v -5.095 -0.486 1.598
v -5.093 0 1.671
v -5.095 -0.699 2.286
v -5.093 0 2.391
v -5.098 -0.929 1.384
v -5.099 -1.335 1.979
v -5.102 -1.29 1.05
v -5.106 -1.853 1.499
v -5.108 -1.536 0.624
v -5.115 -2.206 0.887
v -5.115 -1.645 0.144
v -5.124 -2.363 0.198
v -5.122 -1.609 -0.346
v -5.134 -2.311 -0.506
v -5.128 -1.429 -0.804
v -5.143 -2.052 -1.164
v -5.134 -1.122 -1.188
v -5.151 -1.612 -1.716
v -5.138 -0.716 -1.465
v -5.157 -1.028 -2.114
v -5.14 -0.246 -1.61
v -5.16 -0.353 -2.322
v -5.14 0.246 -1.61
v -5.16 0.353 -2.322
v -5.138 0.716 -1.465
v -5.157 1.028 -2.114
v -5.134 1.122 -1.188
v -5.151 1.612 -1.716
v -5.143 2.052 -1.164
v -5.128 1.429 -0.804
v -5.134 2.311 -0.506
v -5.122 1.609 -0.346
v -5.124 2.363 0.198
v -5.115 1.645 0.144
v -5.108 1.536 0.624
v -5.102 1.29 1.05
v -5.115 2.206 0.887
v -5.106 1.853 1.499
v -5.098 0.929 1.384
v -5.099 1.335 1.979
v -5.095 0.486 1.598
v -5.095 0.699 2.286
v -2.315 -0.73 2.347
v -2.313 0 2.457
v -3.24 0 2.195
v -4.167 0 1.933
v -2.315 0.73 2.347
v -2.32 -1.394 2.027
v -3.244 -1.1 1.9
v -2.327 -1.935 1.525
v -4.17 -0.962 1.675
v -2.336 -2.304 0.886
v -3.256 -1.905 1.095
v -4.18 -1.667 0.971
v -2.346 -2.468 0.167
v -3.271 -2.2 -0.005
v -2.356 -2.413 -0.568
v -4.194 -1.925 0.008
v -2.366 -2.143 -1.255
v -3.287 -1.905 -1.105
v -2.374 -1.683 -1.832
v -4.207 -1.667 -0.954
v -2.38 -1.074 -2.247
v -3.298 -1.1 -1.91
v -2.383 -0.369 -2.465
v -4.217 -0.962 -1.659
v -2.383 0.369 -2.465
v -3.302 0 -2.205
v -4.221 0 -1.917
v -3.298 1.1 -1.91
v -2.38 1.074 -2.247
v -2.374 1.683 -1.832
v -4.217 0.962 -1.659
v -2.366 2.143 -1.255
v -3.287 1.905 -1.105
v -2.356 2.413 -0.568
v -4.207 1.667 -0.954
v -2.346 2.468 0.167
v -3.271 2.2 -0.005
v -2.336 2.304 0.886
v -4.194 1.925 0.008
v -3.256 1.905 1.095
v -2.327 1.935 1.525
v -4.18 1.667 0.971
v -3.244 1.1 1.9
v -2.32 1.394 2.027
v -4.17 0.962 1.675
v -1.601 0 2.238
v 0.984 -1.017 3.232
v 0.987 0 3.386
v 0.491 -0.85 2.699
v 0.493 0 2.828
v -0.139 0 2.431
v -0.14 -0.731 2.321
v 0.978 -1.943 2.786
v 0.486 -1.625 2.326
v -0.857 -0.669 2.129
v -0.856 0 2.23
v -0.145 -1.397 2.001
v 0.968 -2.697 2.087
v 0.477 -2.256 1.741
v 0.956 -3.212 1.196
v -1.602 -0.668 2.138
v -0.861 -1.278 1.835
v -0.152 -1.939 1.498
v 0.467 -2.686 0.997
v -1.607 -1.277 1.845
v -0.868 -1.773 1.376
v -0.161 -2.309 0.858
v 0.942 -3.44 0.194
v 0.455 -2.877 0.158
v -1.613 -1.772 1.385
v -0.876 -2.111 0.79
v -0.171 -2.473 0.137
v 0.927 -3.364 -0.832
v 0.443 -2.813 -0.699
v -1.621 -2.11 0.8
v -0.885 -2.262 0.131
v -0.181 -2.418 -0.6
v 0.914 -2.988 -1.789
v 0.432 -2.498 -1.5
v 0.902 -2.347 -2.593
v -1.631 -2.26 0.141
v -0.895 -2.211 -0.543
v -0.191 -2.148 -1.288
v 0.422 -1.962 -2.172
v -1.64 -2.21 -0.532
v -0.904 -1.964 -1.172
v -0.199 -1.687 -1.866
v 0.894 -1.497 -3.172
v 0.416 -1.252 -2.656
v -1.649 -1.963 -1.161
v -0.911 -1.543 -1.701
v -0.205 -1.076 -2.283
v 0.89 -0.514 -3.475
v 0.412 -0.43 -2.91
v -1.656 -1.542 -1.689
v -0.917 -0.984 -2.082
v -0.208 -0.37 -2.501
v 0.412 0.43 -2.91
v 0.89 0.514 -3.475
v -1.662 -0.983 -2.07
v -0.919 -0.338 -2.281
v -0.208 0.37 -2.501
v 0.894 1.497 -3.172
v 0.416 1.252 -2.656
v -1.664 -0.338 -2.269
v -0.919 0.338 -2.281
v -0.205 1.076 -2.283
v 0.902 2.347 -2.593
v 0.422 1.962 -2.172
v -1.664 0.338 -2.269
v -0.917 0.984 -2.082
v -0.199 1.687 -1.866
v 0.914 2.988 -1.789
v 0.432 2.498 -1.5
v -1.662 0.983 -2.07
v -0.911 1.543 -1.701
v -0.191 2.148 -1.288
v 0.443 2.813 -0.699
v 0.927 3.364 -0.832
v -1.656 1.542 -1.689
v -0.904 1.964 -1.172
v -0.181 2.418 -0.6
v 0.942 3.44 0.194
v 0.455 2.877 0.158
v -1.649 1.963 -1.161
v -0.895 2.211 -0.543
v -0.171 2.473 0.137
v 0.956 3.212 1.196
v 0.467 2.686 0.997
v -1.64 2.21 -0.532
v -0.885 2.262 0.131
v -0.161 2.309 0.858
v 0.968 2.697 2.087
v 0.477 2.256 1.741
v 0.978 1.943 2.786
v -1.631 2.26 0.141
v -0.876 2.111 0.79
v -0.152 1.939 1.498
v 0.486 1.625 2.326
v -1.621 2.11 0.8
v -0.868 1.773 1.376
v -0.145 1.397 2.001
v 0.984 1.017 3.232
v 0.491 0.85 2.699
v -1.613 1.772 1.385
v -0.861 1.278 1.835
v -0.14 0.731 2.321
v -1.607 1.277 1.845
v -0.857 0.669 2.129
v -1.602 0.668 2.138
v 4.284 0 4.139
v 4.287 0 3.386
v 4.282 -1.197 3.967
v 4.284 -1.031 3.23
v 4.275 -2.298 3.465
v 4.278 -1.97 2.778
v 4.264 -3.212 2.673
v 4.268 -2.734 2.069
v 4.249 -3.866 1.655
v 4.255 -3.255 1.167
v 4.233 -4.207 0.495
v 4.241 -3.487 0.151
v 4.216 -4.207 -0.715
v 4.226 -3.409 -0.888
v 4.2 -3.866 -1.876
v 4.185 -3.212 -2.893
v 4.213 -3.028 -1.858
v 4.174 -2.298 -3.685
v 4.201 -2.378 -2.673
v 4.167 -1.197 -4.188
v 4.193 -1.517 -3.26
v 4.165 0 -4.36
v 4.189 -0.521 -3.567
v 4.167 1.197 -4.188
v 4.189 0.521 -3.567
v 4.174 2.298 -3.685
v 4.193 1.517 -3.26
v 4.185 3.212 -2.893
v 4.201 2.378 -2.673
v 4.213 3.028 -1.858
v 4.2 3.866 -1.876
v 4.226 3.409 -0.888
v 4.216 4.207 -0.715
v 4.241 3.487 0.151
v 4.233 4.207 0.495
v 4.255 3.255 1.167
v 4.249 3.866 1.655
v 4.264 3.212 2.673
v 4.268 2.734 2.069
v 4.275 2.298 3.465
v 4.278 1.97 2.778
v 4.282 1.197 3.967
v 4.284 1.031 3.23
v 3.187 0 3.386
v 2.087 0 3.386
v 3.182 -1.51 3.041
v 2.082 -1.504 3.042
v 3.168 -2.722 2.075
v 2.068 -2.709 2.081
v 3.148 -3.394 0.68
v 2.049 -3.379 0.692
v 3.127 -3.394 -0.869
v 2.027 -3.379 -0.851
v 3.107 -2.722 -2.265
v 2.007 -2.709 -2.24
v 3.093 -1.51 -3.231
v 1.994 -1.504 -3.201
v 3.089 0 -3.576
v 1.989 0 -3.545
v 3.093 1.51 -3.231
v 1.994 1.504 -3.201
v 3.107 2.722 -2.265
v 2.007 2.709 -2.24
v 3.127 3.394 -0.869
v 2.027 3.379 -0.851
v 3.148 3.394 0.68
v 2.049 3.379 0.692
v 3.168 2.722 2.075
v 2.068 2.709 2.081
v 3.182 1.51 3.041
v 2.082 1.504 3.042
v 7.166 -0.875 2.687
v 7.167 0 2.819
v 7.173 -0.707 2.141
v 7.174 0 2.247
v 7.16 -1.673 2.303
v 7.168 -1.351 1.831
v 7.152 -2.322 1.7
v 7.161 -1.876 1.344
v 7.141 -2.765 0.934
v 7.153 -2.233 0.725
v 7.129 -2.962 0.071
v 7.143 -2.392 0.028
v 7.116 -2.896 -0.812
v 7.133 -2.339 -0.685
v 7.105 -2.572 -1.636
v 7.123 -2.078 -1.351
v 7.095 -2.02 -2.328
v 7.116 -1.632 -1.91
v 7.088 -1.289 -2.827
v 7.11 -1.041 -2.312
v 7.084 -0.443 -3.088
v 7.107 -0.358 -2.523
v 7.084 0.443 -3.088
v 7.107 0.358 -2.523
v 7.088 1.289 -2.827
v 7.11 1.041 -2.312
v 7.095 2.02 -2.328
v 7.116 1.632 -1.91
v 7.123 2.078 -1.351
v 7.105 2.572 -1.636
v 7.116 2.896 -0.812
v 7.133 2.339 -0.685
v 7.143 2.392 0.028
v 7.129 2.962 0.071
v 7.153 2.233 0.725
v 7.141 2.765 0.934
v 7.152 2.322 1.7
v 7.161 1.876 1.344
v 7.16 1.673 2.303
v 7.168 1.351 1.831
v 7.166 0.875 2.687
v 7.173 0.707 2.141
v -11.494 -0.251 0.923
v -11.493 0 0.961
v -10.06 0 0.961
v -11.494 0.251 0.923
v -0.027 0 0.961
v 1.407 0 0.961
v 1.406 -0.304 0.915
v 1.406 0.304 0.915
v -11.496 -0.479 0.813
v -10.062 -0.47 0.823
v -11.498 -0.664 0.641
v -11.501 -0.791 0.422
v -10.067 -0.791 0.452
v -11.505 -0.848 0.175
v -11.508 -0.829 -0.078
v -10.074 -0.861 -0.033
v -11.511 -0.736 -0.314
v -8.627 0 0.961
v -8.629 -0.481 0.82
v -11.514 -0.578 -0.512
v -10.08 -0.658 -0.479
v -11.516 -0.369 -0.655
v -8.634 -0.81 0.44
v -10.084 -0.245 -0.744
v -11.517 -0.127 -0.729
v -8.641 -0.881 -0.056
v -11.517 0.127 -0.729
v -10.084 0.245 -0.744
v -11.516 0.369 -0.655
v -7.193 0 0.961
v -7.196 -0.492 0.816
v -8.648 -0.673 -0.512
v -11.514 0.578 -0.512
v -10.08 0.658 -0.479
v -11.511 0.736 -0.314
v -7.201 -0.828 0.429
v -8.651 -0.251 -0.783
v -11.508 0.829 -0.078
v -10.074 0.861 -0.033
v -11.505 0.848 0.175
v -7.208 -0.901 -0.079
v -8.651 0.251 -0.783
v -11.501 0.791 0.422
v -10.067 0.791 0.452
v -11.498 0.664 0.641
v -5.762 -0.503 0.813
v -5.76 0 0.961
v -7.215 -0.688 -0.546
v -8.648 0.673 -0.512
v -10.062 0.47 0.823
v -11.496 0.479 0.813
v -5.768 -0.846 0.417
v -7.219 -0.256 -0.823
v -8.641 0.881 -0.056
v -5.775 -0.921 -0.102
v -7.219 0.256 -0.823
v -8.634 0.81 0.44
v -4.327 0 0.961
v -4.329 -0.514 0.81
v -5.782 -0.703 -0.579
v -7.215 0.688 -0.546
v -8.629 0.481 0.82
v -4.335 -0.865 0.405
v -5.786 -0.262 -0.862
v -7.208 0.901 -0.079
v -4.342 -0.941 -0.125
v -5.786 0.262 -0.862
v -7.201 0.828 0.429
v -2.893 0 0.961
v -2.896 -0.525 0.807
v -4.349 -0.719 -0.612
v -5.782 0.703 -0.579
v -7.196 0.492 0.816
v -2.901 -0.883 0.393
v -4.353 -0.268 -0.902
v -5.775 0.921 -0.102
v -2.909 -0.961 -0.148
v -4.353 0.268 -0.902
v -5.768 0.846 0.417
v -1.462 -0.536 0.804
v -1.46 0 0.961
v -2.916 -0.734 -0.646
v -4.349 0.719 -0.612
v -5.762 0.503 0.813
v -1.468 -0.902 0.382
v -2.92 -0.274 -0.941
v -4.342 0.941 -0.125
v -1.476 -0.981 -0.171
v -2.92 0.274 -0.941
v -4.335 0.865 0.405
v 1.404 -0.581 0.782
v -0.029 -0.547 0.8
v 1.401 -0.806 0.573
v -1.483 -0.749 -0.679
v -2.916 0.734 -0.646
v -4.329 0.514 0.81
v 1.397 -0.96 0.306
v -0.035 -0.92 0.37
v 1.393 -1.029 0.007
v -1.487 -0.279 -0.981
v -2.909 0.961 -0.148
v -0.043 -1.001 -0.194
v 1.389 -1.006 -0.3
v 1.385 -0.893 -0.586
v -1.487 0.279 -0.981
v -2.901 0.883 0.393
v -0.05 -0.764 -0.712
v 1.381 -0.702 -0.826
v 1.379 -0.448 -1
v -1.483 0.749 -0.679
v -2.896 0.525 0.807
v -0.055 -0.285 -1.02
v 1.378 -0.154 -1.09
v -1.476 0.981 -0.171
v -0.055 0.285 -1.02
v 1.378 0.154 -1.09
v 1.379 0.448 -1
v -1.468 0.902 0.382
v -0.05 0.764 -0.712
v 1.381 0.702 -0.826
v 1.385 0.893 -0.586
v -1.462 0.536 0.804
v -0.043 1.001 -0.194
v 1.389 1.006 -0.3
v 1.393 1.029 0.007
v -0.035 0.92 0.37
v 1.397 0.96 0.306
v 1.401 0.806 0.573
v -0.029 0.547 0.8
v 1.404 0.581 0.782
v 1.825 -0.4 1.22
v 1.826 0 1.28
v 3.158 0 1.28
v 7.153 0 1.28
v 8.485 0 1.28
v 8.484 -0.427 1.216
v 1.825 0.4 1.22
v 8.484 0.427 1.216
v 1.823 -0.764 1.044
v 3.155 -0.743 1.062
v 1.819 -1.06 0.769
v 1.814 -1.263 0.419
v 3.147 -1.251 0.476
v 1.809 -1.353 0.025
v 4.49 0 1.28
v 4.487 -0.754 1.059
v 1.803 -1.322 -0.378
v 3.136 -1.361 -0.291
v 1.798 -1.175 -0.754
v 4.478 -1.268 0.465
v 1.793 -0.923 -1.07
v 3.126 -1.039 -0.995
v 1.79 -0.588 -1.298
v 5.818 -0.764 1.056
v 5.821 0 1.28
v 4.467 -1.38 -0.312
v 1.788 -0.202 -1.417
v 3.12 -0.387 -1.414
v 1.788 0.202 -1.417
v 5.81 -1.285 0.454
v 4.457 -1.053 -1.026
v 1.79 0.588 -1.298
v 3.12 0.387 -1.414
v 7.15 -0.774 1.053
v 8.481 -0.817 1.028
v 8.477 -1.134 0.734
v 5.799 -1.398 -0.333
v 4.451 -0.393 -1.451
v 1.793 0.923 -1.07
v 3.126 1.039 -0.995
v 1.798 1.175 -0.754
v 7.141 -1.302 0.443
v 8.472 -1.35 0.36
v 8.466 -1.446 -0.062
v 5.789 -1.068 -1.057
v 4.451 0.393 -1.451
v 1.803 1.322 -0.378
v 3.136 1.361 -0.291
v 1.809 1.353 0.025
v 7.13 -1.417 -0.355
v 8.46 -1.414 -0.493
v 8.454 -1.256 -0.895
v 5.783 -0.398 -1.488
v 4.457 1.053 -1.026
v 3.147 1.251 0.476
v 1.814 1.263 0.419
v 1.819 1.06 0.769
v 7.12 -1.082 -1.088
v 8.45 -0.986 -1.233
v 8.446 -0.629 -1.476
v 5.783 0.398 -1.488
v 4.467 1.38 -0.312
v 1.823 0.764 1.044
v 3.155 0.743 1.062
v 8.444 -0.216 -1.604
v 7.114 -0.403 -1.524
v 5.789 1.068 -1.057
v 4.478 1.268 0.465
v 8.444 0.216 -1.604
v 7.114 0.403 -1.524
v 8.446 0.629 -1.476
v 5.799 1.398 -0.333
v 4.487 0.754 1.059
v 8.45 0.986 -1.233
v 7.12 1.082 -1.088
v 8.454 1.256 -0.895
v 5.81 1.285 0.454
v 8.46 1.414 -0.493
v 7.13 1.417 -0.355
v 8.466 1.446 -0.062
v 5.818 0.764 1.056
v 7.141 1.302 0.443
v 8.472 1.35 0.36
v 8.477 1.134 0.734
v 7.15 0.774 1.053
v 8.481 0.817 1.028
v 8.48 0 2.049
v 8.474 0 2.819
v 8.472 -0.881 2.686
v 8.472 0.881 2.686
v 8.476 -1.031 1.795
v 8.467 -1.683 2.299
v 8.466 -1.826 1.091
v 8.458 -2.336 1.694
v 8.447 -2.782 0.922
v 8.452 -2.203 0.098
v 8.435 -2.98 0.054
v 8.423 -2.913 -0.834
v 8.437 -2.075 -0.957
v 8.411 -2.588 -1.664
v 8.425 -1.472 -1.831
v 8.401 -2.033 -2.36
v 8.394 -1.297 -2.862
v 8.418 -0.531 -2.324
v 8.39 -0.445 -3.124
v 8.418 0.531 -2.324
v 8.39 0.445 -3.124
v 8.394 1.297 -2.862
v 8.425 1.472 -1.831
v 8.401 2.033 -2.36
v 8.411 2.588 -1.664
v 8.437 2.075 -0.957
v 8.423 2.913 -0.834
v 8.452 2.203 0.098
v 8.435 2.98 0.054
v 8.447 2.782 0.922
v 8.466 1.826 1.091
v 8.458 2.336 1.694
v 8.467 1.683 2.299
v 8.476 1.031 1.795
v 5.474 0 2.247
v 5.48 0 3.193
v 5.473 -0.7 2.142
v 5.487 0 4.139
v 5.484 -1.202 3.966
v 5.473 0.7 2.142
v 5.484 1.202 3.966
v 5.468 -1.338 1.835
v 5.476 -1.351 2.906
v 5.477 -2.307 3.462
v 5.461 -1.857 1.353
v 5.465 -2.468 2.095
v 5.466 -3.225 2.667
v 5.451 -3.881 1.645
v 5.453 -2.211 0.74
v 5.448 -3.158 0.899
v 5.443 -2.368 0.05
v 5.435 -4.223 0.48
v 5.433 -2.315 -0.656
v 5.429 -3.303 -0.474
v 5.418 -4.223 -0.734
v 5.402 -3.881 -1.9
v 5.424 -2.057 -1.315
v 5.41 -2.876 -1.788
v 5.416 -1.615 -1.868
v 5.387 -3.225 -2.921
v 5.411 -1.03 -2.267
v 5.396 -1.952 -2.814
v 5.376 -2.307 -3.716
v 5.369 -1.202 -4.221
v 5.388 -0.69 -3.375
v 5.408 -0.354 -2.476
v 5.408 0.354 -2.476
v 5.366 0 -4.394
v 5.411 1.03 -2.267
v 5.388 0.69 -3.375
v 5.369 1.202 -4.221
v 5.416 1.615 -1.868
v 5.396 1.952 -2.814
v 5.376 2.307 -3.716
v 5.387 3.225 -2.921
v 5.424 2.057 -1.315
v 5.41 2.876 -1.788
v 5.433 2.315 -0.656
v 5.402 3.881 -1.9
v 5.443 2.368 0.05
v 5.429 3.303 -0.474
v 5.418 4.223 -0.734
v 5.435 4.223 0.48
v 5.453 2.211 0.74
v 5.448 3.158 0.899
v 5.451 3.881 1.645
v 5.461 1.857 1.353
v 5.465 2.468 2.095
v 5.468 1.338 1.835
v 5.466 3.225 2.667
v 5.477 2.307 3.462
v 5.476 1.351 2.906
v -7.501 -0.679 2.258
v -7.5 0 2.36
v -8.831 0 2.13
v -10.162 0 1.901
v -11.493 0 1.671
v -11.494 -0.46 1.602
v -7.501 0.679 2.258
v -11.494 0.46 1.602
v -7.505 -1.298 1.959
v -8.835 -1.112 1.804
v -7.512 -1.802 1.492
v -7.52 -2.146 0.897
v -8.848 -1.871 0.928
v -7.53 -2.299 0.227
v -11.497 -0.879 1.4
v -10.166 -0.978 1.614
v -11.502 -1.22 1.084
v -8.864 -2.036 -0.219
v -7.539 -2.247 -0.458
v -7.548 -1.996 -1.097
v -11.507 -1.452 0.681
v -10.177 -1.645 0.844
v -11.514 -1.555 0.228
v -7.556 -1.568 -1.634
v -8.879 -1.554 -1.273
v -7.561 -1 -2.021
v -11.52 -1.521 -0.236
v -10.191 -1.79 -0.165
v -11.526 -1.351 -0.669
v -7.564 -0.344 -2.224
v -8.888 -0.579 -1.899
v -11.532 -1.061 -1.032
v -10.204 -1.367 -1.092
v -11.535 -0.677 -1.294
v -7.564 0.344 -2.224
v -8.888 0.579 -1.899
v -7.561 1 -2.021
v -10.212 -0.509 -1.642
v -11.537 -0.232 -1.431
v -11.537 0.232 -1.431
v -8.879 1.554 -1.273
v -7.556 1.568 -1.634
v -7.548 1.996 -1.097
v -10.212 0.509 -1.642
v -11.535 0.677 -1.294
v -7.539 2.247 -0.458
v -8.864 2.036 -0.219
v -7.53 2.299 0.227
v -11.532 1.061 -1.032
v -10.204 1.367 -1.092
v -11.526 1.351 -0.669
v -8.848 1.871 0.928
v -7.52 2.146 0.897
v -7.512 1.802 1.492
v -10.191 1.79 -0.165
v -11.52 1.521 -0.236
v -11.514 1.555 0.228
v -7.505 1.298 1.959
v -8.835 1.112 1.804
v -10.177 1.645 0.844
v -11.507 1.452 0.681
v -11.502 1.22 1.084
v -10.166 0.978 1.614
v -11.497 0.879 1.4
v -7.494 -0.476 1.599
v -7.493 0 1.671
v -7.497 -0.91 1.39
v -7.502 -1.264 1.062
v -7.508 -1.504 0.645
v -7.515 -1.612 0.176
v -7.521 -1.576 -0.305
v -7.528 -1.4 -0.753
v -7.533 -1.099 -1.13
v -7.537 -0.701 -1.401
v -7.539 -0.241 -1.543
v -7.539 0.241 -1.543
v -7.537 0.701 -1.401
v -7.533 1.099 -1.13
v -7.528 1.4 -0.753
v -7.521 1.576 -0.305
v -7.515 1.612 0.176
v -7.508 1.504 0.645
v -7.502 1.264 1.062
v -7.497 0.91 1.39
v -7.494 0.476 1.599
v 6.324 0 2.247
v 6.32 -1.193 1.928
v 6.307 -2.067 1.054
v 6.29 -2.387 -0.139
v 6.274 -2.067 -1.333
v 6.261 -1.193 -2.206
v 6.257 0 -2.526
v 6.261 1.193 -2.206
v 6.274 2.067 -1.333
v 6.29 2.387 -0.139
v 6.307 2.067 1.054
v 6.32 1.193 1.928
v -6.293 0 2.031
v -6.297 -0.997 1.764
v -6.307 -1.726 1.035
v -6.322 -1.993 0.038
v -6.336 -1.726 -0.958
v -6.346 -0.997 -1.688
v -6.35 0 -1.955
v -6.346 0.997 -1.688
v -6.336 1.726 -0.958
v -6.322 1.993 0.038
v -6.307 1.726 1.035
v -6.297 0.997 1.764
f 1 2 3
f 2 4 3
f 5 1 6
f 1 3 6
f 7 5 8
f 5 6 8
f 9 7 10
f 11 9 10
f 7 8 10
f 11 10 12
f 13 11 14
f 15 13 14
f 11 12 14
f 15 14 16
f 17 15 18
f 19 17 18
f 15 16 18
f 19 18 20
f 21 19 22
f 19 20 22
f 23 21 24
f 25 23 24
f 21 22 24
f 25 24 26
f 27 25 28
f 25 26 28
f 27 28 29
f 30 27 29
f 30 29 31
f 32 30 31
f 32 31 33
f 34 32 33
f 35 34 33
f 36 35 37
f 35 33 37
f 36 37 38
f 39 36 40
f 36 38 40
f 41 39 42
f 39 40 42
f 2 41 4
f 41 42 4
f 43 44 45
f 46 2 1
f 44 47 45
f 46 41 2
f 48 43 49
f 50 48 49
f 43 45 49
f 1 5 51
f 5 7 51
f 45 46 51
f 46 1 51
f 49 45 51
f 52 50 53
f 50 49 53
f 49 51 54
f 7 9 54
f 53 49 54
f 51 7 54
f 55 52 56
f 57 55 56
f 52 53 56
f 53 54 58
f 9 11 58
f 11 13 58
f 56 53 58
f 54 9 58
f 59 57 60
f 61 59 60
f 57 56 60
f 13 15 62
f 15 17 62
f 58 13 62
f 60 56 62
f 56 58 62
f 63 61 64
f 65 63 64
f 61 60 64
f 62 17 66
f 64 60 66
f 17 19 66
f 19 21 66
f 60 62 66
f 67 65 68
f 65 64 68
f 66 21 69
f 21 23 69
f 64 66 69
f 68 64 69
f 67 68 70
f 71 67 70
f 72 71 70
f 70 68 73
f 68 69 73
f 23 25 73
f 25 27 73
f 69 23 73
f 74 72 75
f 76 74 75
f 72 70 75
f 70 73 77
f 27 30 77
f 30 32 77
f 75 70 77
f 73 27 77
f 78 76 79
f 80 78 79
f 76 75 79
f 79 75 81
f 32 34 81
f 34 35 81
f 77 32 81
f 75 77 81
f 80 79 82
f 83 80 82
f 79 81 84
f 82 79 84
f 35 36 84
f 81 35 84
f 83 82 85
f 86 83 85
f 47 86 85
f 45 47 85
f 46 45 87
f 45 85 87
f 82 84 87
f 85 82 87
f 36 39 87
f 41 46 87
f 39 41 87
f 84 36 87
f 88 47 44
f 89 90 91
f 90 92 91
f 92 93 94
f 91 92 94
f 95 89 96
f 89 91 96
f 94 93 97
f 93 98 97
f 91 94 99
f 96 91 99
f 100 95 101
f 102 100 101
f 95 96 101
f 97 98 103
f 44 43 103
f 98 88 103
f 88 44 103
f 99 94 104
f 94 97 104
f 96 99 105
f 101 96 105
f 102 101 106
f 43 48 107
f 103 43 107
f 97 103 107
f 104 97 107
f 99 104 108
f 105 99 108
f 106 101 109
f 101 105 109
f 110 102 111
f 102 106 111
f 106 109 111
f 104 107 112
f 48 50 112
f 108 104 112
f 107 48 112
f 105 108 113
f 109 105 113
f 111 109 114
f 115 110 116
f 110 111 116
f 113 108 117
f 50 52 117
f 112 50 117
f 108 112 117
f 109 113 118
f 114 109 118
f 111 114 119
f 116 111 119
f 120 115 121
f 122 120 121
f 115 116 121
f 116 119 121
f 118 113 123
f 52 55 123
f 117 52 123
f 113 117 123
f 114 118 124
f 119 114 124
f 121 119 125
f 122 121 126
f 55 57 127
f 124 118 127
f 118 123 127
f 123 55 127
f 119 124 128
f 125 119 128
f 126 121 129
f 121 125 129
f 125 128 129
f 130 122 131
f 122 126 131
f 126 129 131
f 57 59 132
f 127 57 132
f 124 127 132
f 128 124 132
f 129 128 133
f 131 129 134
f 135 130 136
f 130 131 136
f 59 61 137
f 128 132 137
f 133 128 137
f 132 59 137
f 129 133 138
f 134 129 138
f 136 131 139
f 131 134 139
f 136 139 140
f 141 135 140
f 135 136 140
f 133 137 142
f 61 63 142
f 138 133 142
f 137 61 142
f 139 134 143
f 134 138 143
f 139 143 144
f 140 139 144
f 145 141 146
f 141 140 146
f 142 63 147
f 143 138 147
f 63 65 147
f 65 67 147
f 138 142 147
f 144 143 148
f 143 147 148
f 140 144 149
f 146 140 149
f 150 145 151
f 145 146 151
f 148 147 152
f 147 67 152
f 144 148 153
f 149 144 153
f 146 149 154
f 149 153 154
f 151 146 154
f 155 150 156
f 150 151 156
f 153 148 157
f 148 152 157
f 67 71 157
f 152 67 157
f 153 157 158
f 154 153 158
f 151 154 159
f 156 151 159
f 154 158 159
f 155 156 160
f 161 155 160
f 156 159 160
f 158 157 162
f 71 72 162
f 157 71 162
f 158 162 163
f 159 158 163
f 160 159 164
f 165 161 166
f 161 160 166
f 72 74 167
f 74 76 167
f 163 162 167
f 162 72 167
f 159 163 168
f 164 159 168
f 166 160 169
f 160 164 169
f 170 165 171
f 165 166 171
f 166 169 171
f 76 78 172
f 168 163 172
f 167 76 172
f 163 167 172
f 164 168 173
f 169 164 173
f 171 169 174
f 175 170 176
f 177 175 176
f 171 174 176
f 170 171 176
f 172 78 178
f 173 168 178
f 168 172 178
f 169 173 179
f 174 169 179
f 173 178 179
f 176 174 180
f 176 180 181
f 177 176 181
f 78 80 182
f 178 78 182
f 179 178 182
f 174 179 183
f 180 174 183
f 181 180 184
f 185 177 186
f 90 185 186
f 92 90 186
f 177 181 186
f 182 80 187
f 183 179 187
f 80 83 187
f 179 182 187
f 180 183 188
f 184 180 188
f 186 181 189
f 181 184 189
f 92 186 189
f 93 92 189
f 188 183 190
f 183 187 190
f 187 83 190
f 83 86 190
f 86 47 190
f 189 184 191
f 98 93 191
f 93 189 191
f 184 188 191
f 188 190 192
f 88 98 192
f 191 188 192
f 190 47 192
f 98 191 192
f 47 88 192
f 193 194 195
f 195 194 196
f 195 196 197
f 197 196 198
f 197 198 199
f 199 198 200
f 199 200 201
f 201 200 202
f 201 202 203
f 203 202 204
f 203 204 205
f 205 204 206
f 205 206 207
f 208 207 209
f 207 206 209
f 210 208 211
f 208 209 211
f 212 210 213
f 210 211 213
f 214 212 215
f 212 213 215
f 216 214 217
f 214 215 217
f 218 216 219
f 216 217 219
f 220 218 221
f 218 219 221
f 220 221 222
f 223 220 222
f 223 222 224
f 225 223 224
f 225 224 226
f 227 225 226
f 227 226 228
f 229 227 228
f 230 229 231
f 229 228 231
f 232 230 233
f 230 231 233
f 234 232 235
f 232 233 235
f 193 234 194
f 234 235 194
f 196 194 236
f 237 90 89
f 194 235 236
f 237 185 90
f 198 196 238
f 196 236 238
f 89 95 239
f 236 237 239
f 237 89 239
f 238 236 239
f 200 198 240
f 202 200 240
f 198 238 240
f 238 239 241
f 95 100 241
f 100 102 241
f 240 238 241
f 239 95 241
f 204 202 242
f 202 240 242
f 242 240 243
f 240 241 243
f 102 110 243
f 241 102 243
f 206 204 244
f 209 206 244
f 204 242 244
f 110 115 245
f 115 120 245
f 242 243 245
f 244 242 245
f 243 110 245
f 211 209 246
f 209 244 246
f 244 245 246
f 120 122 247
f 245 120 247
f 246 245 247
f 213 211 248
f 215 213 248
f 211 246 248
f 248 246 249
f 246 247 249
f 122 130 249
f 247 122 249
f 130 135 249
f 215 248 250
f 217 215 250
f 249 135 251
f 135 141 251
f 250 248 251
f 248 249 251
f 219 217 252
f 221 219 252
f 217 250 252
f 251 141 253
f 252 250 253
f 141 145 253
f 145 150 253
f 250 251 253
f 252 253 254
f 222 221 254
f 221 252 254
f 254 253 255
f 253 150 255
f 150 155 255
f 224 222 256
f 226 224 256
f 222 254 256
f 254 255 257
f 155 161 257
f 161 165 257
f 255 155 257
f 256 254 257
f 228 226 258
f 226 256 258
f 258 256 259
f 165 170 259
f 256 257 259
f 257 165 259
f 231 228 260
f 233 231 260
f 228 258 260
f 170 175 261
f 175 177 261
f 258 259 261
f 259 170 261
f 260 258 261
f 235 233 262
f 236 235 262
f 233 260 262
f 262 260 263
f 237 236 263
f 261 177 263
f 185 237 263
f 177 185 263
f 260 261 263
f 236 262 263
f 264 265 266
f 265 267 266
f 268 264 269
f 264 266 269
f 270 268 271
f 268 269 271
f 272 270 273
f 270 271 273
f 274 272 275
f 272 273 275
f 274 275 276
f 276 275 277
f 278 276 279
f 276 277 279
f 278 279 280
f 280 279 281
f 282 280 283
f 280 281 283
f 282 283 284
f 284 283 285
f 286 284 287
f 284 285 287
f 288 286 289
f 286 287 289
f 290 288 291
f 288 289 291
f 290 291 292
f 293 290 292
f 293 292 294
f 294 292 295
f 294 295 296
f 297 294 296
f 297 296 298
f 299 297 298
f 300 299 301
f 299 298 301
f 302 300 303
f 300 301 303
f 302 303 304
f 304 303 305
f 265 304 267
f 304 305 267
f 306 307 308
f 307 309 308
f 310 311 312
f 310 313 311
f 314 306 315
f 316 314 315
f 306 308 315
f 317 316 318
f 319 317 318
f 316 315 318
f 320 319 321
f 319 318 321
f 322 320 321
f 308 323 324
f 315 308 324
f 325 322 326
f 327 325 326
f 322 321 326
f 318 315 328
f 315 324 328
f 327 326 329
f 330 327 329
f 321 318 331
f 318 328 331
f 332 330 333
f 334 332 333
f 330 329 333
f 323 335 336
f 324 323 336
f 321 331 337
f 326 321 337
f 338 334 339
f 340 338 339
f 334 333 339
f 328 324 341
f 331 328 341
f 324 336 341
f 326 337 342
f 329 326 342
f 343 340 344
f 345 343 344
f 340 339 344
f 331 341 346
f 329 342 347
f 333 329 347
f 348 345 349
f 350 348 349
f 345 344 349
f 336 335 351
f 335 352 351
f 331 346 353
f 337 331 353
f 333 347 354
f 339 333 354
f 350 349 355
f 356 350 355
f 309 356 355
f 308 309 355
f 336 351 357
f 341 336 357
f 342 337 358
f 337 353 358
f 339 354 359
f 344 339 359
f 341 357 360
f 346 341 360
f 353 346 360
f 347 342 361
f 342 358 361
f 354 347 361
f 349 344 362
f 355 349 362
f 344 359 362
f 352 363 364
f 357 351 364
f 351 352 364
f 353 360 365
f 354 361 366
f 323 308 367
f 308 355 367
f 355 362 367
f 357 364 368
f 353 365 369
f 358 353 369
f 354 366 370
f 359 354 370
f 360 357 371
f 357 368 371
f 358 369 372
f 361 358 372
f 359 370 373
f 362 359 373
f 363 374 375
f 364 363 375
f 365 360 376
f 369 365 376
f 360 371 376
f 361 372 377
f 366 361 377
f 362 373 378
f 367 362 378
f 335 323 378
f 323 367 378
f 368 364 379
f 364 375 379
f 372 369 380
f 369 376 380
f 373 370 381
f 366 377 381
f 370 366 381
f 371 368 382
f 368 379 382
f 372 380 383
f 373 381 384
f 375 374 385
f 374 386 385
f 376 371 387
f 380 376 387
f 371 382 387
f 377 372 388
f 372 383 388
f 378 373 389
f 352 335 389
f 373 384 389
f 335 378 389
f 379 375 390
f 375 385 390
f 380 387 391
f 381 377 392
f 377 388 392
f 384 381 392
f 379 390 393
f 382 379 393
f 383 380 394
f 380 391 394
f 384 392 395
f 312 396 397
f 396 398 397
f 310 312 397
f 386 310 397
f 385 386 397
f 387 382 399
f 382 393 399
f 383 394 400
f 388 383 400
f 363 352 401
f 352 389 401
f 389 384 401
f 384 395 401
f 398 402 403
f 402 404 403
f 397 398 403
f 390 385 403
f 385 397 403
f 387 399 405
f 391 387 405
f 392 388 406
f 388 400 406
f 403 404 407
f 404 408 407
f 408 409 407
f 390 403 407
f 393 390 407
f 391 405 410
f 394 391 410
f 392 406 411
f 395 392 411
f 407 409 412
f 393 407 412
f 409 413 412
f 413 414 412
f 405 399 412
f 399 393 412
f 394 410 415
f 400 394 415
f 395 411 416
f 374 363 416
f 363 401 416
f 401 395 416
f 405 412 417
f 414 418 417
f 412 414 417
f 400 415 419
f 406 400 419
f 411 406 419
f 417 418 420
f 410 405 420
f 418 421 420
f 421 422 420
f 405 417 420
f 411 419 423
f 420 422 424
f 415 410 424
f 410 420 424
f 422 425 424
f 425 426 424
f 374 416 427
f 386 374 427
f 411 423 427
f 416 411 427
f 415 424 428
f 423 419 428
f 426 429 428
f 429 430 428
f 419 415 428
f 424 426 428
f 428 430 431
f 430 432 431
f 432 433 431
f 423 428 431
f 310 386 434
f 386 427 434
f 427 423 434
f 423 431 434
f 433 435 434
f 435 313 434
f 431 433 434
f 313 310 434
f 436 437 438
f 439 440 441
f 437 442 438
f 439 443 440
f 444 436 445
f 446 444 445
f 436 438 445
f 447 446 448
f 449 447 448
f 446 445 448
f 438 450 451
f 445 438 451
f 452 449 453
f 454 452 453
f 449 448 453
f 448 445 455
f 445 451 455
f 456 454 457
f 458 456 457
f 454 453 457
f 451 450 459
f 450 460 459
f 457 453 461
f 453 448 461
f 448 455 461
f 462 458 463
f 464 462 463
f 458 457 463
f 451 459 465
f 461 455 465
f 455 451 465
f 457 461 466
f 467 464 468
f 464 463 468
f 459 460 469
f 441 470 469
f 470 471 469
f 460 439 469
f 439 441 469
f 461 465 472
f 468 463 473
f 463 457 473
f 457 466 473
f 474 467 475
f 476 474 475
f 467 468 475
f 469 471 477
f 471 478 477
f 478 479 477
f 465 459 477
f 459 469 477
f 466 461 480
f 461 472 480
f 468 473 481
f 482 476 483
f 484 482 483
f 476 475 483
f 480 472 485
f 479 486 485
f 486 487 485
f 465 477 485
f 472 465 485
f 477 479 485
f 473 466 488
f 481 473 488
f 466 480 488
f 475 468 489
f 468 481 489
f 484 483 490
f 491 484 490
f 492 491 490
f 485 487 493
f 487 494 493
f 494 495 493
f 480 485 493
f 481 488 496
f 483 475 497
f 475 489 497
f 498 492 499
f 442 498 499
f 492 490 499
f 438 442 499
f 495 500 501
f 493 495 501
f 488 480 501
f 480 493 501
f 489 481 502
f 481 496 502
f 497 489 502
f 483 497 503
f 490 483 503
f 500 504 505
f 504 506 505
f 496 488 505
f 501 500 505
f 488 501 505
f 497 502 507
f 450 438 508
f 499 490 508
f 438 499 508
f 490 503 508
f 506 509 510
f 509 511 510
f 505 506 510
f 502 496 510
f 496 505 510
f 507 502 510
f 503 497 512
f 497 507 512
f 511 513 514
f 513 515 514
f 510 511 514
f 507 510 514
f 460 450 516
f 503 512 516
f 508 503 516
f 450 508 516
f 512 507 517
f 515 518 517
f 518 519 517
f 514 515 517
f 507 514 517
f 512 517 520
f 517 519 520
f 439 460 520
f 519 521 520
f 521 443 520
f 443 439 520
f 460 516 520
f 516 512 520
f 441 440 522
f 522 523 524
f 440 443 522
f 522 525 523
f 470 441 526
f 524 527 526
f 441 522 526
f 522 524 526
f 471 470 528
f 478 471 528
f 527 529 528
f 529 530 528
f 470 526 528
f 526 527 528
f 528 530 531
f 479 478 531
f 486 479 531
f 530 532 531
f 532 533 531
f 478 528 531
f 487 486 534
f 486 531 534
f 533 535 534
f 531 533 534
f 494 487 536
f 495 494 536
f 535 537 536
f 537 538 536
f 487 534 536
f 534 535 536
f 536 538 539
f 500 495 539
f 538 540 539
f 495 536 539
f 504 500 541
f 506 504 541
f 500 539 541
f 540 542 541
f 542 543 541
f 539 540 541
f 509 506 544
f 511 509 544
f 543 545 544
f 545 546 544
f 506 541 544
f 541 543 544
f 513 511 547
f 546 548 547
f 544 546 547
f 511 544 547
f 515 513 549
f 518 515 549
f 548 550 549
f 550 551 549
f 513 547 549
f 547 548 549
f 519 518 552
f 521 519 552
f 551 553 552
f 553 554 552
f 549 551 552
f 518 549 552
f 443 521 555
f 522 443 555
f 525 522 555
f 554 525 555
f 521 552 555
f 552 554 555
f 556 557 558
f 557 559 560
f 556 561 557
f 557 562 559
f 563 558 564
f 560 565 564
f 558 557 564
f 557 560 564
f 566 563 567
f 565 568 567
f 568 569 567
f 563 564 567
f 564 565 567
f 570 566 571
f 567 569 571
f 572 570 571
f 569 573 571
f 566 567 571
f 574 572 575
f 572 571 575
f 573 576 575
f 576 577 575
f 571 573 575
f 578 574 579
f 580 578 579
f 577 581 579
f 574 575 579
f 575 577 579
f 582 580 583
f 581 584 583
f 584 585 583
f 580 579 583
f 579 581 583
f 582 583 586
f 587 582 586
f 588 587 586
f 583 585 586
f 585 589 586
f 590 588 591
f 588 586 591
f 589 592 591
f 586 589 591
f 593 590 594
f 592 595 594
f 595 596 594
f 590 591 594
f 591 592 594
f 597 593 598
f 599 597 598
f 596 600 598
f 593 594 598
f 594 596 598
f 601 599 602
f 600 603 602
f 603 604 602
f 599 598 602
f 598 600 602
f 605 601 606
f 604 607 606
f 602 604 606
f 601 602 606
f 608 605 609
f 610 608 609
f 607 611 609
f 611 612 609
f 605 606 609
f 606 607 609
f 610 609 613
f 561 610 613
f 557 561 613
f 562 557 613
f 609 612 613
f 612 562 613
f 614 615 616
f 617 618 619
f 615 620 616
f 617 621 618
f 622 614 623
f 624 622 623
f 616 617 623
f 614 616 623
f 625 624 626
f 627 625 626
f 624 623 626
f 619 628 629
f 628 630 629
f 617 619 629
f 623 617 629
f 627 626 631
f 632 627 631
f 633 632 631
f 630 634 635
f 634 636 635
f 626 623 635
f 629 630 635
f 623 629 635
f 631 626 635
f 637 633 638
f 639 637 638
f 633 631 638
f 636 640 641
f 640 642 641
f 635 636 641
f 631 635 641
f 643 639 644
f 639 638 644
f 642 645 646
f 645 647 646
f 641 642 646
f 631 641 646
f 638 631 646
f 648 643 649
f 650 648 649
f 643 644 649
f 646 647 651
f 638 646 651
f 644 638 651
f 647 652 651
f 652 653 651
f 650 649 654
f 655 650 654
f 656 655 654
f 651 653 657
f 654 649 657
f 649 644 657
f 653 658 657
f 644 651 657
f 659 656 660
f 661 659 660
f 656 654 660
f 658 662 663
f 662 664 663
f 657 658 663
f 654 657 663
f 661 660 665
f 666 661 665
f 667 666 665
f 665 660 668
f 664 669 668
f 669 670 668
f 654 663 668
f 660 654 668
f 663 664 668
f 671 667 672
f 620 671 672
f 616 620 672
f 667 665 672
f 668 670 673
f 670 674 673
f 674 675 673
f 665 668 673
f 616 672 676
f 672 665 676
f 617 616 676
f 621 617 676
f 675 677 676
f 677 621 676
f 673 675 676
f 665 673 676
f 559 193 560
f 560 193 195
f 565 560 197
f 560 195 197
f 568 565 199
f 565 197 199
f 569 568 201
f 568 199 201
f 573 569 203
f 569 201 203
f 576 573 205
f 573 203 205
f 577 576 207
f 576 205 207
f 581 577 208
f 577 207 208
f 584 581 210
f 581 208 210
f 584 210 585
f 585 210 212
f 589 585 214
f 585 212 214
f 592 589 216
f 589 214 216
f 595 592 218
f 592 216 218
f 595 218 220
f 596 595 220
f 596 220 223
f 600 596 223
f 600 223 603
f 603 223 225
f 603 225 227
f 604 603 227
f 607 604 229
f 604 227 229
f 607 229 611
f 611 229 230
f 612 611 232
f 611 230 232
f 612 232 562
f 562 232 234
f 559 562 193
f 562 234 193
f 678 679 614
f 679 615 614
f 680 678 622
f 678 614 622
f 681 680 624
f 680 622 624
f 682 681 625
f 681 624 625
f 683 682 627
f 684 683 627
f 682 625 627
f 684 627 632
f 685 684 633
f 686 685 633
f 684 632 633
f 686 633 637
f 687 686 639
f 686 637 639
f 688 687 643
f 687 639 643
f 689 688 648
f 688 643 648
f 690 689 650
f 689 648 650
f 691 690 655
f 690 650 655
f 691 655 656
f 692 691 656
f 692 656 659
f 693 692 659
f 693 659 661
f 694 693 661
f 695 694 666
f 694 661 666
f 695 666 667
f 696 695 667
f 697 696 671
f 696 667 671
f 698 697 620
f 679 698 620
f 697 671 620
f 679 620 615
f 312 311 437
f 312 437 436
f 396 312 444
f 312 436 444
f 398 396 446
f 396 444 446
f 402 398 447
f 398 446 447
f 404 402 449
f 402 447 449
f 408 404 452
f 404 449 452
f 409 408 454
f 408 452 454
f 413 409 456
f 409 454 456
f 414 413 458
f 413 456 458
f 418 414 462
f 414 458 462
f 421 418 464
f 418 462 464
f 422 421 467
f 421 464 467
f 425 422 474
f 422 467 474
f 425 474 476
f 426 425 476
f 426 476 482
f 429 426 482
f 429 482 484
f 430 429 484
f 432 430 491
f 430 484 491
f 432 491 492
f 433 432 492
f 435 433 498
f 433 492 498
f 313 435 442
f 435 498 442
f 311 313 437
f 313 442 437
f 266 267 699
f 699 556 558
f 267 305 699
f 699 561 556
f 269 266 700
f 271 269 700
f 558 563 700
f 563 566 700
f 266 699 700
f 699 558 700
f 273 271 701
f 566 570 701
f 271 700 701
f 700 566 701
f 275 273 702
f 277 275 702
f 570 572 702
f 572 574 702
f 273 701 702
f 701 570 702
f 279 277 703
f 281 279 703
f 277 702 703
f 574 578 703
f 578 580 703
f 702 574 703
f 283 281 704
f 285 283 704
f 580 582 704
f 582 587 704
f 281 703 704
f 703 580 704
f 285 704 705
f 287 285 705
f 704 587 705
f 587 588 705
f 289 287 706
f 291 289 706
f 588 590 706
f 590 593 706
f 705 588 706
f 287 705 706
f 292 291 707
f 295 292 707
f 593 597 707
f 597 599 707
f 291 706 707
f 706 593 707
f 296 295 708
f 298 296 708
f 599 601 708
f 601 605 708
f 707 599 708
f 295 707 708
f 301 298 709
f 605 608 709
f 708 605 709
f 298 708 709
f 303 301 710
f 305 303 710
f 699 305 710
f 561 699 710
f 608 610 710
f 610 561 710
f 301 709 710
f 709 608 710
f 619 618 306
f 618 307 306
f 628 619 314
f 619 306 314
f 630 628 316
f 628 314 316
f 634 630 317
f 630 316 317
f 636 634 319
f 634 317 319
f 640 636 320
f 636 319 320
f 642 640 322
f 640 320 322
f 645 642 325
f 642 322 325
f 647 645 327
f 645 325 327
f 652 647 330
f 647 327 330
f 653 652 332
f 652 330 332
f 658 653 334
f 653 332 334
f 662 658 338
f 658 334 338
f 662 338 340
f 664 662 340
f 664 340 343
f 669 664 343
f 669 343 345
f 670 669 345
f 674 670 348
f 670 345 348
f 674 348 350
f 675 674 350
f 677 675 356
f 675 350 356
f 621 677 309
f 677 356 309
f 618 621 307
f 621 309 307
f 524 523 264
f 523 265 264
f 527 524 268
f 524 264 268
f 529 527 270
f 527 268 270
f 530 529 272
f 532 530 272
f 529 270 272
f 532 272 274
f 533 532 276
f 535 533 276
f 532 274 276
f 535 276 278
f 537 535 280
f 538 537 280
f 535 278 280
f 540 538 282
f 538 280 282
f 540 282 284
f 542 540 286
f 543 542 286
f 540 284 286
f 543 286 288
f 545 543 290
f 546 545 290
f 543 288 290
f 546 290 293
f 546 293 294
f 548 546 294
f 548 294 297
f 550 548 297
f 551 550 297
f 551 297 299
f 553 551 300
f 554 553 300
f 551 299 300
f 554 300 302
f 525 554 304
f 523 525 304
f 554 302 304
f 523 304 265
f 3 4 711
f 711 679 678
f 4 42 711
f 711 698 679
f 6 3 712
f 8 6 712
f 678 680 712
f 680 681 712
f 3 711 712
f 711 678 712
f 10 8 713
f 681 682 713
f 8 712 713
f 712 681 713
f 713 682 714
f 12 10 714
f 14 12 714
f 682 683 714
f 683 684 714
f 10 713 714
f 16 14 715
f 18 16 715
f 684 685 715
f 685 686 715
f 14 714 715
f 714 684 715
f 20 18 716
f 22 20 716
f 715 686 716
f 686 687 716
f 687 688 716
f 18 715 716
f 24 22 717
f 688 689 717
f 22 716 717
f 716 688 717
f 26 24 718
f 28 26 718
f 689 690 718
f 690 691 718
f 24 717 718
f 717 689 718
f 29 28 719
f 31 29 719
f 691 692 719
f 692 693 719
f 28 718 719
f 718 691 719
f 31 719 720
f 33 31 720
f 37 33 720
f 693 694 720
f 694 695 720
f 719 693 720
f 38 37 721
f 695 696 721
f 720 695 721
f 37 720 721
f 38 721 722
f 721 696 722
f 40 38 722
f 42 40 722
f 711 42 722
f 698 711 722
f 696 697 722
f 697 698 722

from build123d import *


with BuildPart() as part:
    # Sketch1 → Revolve1 (revolve)
    with BuildSketch(Plane(origin=(0, 0, 0), x_dir=(1, 0, 0), z_dir=(0, 1, 0))):
        with BuildLine():
            Line((-11.493478261, -0.960869565), (1.406521739, -0.960869565))
            Line((1.406521739, -0.960869565), (1.826198847, -1.279930678))
            Line((1.826198847, -1.279930678), (8.484993151, -1.279930678))
            Line((8.484993151, -1.279930678), (8.474039616, -2.818617799))
            Line((8.474039616, -2.818617799), (7.16746221, -2.818617799))
            Line((7.16746221, -2.818617799), (7.174039616, -2.247384123))
            Line((7.174039616, -2.247384123), (5.474039616, -2.247384123))
            Line((5.474039616, -2.247384123), (5.486521739, -4.139307546))
            Line((5.486521739, -4.139307546), (4.284364062, -4.139307546))
            Line((4.284364062, -4.139307546), (4.286521739, -3.385626586))
            Line((4.286521739, -3.385626586), (0.986521739, -3.385626586))
            ThreePointArc((0.986521739, -3.385626586), (-0.48998153, -2.304776001), (-2.313478261, -2.456958665))
            Line((-2.313478261, -2.456958665), (-5.093478261, -1.670869565))
            Line((-5.093478261, -1.670869565), (-5.093478261, -2.391060827))
            Line((-5.093478261, -2.391060827), (-7.493478261, -1.670869565))
            Line((-7.493478261, -1.670869565), (-7.499524272, -2.359905691))
            Line((-7.499524272, -2.359905691), (-11.493478261, -1.670869565))
            Line((-11.493478261, -1.670869565), (-11.493478261, -0.960869565))
        make_face()
    revolve(axis=Axis((-11.493478261, 0, 0.110869565), (0.9999010425950651, 0, -0.014067871811395011)))


solid = part.part
